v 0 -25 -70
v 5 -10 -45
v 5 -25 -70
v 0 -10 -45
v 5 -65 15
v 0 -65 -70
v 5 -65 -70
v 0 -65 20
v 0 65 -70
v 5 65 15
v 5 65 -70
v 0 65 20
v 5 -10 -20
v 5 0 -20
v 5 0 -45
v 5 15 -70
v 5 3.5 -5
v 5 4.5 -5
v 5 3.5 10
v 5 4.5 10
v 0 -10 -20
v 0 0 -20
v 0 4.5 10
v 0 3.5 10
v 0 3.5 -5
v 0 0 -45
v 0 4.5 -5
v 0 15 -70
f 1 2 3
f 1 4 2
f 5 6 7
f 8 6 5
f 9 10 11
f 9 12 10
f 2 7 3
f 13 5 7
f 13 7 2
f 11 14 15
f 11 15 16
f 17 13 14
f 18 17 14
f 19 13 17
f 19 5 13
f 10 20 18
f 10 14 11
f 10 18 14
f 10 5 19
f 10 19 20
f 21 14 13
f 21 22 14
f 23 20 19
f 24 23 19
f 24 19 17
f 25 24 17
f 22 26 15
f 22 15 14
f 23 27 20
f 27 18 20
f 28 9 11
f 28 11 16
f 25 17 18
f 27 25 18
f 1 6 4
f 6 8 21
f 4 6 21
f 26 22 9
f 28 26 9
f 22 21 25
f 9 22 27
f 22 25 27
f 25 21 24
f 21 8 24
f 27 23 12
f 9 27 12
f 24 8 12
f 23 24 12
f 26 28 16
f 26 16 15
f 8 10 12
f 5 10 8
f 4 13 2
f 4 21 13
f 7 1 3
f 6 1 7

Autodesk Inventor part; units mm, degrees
ref_plane "YZ Plane" through (0, 0, 0) normal (1, 0, 0) x (0, 1, 0)
ref_plane "XZ Plane" through (0, 0, 0) normal (0, 1, 0) x (-1, 0, 0)
ref_plane "XY Plane" through (0, 0, 0) normal (0, 0, 1) x (1, 0, 0)
sketch "スケッチ1" plane through (0, 0, 0) normal (1, 0, 0) x (0, 1, 0)
  line L0 (-65, 20) -> (65, 20)
  line L1 (65, 20) -> (65, -20)
  line L2 (65, -20) -> (-65, -20)
  line L3 (-65, -20) -> (-65, 20)
  line L4 (-65, 20) -> (65, -20) construction
  line L5 (65, 20) -> (-65, -20) construction
  line L6 (65, -20) -> (65, -70)
  line L7 (65, -70) -> (15, -70)
  line L8 (15, -70) -> (0, -45)
  line L9 (-10, -45) -> (-25, -70)
  line L10 (-25, -70) -> (-65, -70)
  line L11 (-65, -70) -> (-65, -20)
  line L12 (0, -45) -> (-10, -45)
  line L13 (0, -20) -> (-10, -20)
  line L14 (-10, -20) -> (-10, -45)
  line L15 (-10, -45) -> (0, -45)
  line L16 (0, -45) -> (0, -20)
  point P0 (0, 0)
  point P1 (-5, -45)
  point P2 (0, 0)
  point P3 (0, -45)
  dimension "d0" = 130
  dimension "d1" = 40
  dimension "d18" = 50
  dimension "d19" = 50
  dimension "d22" = 5
  dimension "d24" = 25
  dimension "d25" = 10
extrude "押し出し1" add sketch "スケッチ1" along normal blind 5 contours L0 L1 L2 L3 | L2 L14 L9 L10 L11 | L6 L7 L8 L16 L2
sketch "スケッチ3" plane through (5, 0, 0) normal (1, 0, 0) x (0, 0, -1)
  line L0 (-10, 3.5) -> (5, 3.5)
  line L1 (5, 3.5) -> (5, 4.5)
  line L2 (5, 4.5) -> (-10, 4.5)
  line L3 (-10, 4.5) -> (-10, 3.5)
  line L4 (-15, 0) -> (10, 0)
  line L5 (10, 0) -> (10, 8)
  line L6 (10, 8) -> (-15, 8)
  line L7 (-15, 8) -> (-15, 0)
  line L8 (-20, 65) -> (-20, -65) projected
  point P0 (0, 0)
  point P1 (-2.5, 8)
  point P2 (-2.5, 4.5)
  point P3 (-10, 4)
  point P4 (-15, 4)
  dimension "d7" = 15
  dimension "d8" = 1
  dimension "d9" = 25
  dimension "d10" = 8
  dimension "d17" = 5
extrude "押し出し3" cut sketch "スケッチ3" against normal through all contours L3 L2 L1 L0
chamfer "面取り1" distance 5 angle 45 1 edges at (5, 0, 20)
properties part number "VertMove" material "スタイロフォームIB"
